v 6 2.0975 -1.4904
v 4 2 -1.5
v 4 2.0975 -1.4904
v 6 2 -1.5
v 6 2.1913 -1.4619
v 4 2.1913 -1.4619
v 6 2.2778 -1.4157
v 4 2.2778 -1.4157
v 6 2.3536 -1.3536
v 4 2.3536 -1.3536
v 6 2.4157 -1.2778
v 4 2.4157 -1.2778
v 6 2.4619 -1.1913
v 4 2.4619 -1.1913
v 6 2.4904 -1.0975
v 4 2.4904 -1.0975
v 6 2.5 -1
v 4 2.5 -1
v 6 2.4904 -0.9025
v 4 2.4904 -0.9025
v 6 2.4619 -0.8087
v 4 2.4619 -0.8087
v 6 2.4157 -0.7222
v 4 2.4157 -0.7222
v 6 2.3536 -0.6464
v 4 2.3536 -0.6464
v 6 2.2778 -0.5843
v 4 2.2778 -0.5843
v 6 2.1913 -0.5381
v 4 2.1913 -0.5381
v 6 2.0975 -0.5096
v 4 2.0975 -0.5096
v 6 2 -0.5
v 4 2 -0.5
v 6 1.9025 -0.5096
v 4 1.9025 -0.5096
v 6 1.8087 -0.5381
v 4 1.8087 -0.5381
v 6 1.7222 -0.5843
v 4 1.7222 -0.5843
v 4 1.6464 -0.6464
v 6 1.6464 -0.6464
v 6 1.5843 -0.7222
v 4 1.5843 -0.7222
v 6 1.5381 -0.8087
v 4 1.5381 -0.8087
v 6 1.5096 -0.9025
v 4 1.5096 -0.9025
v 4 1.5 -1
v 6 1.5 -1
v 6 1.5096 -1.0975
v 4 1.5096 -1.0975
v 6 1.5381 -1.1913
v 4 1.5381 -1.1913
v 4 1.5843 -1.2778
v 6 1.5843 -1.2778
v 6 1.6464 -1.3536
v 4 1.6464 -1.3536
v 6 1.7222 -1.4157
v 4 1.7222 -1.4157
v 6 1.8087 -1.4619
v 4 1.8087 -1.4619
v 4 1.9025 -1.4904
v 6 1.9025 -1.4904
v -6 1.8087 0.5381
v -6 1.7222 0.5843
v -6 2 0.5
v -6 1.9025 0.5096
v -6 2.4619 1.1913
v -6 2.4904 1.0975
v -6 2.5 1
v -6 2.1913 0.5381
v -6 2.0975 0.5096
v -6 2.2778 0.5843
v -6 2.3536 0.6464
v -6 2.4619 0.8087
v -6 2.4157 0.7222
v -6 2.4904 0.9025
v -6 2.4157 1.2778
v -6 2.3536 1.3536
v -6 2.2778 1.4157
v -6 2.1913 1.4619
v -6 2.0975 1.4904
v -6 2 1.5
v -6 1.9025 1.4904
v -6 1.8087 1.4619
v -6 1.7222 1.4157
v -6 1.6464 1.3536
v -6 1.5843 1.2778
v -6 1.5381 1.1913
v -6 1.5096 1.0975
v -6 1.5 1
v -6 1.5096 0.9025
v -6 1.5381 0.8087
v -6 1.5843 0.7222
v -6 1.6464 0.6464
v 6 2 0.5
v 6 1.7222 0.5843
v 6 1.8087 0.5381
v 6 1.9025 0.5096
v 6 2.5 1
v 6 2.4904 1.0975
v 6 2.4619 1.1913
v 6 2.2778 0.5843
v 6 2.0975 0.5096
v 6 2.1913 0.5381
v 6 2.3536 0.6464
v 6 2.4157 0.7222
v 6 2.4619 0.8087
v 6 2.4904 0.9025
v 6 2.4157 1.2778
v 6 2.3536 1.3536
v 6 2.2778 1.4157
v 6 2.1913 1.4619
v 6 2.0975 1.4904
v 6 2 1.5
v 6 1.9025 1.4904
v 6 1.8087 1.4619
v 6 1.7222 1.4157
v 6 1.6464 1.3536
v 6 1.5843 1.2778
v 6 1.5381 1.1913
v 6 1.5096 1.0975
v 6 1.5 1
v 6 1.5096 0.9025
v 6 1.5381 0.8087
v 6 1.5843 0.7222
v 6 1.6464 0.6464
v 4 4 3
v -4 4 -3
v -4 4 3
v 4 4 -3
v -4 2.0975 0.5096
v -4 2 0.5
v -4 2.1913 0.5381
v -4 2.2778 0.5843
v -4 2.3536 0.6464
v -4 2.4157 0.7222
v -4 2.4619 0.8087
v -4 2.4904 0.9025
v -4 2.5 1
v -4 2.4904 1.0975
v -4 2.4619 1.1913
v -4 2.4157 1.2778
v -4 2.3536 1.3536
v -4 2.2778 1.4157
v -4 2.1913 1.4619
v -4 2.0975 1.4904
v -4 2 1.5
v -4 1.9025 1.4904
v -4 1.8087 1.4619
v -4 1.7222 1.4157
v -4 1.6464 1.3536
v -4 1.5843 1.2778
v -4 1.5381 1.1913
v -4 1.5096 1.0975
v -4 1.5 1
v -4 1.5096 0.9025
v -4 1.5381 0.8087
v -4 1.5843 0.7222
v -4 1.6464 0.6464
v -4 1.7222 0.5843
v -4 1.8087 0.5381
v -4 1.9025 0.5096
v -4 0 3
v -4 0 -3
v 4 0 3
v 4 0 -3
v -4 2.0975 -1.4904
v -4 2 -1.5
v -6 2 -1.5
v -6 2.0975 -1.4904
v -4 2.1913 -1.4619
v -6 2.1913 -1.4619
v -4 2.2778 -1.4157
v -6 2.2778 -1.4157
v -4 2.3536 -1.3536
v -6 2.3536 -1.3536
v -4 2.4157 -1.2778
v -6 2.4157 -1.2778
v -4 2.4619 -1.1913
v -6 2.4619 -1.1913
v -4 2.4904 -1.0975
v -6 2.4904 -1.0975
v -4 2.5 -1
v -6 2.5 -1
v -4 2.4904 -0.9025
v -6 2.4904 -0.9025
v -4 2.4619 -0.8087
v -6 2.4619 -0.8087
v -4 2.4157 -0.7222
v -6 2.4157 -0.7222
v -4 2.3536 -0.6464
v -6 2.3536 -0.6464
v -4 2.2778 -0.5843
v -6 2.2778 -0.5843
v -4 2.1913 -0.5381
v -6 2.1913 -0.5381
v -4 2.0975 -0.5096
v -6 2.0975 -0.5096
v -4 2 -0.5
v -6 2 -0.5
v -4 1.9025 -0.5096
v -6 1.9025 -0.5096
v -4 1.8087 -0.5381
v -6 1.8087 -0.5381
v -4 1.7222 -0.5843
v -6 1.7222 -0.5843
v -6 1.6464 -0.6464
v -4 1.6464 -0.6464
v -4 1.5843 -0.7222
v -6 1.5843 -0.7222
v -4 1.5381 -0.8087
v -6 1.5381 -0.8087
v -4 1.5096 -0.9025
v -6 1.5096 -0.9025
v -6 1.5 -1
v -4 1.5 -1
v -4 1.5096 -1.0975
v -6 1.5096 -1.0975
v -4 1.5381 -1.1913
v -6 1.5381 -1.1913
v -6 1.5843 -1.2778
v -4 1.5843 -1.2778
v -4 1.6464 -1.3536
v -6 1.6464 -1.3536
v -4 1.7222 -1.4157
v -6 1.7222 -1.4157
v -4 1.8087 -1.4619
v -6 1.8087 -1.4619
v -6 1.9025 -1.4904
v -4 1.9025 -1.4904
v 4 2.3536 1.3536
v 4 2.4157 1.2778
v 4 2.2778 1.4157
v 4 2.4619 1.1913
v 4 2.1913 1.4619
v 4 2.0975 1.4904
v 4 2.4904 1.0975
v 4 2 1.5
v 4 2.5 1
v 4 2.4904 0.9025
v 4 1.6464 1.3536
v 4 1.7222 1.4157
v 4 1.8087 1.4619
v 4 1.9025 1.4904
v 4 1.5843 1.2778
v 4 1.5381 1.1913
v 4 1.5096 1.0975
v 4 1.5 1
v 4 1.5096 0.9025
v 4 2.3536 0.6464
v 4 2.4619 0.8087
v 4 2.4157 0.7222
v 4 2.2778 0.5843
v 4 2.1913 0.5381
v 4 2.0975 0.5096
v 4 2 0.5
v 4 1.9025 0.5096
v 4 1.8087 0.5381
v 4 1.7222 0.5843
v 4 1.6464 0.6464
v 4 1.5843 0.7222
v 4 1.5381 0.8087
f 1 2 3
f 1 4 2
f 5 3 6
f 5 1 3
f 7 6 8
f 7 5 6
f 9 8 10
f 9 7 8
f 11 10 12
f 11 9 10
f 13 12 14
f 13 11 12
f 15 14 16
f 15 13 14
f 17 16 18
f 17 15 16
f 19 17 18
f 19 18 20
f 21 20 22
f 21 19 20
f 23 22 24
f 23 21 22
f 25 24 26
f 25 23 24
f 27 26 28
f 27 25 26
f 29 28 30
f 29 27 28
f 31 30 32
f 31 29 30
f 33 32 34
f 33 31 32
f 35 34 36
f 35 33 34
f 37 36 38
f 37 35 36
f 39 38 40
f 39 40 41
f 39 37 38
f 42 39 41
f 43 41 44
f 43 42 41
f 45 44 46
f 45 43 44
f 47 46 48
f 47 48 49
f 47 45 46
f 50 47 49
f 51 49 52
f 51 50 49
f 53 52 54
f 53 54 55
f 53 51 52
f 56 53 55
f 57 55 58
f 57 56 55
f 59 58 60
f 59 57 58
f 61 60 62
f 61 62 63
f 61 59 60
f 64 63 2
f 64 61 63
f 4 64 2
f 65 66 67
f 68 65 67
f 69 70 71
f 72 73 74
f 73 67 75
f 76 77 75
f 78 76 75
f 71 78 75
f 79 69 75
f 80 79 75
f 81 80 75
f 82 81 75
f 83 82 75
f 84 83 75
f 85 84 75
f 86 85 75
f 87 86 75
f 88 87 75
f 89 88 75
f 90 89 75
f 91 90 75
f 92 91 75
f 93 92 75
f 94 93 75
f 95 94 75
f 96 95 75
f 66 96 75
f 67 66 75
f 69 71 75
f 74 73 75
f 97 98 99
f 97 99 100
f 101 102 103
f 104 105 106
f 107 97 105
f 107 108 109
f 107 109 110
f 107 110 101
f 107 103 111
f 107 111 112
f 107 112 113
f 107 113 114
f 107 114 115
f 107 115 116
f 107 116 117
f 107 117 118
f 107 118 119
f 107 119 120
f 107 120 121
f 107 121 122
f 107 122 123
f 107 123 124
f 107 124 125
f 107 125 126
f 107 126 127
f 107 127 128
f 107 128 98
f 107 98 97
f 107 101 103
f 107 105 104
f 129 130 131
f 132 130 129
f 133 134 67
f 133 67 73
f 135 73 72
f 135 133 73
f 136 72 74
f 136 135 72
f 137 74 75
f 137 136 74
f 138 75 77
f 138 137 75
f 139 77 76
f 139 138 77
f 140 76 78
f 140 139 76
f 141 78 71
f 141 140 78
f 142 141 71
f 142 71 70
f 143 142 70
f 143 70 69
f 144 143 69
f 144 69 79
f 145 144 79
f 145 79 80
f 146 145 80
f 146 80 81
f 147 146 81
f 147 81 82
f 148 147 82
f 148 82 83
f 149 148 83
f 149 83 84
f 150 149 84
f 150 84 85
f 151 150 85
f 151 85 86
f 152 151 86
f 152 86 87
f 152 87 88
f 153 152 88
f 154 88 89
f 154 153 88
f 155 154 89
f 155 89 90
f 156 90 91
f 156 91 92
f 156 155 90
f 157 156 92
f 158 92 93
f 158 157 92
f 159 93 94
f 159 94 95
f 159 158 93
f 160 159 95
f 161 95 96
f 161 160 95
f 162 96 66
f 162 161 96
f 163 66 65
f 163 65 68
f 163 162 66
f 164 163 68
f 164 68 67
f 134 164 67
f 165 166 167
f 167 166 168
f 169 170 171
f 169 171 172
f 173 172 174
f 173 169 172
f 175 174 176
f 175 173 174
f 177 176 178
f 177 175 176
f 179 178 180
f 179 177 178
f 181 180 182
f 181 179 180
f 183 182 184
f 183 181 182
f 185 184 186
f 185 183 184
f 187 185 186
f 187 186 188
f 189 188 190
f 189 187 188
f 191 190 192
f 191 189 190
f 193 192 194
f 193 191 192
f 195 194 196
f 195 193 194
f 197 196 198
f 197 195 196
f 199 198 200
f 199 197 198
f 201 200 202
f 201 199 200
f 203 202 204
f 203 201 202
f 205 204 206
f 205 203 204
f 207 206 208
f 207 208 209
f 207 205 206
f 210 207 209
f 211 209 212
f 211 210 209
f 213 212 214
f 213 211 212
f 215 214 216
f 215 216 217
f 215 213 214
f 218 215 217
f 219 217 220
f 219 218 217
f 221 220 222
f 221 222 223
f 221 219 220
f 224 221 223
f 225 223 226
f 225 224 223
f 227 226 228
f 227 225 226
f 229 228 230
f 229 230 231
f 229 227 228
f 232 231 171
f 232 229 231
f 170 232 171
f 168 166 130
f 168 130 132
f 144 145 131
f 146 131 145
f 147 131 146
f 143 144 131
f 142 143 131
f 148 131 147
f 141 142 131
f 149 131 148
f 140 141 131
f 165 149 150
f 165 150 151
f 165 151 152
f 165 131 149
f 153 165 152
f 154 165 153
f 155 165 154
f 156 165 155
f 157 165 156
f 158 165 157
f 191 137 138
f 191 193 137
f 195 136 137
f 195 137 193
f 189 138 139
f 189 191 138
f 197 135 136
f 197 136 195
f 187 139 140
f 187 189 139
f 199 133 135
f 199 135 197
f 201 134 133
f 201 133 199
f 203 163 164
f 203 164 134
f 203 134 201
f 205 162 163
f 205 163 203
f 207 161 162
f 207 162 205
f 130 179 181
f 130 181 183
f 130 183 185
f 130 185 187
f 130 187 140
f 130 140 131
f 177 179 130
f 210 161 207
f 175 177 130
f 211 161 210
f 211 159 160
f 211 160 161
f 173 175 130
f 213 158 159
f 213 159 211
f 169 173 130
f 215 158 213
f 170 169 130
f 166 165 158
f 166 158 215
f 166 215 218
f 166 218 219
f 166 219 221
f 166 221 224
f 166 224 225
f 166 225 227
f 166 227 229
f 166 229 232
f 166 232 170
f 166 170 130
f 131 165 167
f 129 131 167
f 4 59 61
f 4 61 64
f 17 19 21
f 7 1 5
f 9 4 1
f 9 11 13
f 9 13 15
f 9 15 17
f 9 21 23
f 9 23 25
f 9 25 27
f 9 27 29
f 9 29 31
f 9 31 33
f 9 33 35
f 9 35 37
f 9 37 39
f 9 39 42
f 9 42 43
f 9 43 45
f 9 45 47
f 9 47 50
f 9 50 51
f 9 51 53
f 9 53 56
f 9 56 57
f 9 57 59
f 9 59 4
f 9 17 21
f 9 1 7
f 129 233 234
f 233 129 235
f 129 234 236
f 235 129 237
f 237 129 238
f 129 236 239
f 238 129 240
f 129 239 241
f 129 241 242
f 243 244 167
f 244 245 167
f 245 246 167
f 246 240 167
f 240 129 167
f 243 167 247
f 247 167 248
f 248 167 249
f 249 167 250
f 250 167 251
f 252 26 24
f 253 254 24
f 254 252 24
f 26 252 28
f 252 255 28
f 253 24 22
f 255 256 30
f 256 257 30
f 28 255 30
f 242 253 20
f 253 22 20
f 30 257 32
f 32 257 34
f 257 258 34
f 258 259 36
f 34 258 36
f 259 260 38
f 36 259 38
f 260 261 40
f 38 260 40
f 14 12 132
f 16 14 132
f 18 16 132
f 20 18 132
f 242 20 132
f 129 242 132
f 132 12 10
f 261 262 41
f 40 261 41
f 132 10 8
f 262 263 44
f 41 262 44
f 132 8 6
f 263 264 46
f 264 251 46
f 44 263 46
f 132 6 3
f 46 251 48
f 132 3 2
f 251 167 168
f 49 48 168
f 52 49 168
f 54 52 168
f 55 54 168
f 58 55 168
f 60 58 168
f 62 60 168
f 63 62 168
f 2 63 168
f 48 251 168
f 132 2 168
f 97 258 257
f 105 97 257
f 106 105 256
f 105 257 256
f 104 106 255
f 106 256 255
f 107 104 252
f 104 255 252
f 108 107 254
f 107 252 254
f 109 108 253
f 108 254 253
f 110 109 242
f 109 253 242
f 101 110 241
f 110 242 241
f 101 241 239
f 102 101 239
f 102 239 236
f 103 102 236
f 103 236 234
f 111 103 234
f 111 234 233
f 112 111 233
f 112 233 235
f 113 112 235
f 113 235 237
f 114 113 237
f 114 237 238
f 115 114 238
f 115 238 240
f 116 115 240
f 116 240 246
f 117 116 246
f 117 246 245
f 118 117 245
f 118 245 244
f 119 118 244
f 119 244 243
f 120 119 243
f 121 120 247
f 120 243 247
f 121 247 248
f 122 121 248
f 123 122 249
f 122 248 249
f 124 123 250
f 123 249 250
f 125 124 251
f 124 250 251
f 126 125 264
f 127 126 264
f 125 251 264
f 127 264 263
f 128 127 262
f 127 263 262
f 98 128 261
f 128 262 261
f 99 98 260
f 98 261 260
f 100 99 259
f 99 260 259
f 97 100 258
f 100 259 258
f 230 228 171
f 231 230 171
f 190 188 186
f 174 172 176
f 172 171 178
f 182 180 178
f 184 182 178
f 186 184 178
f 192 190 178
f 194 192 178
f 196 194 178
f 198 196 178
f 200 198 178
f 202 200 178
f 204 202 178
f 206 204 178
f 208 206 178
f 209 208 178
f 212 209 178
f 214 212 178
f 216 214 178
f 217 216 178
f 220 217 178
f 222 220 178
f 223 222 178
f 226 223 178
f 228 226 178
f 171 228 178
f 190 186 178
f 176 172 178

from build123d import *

# Parameters (mm, degrees)
SKETCH1_W           = 8
SKETCH1_H           = 6
BOSS_EXTRUDE1_DEPTH = 4
SKETCH2_R           = 0.5
BOSS_EXTRUDE2_DEPTH = 6


with BuildPart() as part:
    # Sketch1 → Boss-Extrude1 (new body)
    with BuildSketch(Plane(origin=(0, 0, 0), x_dir=(1, 0, 0), z_dir=(0, 1, 0))):
        Rectangle(SKETCH1_W, SKETCH1_H)
    extrude(amount=BOSS_EXTRUDE1_DEPTH)

    # Sketch2 → Boss-Extrude2 (add, symmetric)
    with BuildSketch(Plane(origin=(0, 0, 0), x_dir=(0, 0, -1), z_dir=(1, 0, 0))):
        with Locations((-1, 2)):
            Circle(SKETCH2_R)
        with Locations((1, 2)):
            Circle(SKETCH2_R)
    extrude(amount=BOSS_EXTRUDE2_DEPTH, both=True)


solid = part.part
